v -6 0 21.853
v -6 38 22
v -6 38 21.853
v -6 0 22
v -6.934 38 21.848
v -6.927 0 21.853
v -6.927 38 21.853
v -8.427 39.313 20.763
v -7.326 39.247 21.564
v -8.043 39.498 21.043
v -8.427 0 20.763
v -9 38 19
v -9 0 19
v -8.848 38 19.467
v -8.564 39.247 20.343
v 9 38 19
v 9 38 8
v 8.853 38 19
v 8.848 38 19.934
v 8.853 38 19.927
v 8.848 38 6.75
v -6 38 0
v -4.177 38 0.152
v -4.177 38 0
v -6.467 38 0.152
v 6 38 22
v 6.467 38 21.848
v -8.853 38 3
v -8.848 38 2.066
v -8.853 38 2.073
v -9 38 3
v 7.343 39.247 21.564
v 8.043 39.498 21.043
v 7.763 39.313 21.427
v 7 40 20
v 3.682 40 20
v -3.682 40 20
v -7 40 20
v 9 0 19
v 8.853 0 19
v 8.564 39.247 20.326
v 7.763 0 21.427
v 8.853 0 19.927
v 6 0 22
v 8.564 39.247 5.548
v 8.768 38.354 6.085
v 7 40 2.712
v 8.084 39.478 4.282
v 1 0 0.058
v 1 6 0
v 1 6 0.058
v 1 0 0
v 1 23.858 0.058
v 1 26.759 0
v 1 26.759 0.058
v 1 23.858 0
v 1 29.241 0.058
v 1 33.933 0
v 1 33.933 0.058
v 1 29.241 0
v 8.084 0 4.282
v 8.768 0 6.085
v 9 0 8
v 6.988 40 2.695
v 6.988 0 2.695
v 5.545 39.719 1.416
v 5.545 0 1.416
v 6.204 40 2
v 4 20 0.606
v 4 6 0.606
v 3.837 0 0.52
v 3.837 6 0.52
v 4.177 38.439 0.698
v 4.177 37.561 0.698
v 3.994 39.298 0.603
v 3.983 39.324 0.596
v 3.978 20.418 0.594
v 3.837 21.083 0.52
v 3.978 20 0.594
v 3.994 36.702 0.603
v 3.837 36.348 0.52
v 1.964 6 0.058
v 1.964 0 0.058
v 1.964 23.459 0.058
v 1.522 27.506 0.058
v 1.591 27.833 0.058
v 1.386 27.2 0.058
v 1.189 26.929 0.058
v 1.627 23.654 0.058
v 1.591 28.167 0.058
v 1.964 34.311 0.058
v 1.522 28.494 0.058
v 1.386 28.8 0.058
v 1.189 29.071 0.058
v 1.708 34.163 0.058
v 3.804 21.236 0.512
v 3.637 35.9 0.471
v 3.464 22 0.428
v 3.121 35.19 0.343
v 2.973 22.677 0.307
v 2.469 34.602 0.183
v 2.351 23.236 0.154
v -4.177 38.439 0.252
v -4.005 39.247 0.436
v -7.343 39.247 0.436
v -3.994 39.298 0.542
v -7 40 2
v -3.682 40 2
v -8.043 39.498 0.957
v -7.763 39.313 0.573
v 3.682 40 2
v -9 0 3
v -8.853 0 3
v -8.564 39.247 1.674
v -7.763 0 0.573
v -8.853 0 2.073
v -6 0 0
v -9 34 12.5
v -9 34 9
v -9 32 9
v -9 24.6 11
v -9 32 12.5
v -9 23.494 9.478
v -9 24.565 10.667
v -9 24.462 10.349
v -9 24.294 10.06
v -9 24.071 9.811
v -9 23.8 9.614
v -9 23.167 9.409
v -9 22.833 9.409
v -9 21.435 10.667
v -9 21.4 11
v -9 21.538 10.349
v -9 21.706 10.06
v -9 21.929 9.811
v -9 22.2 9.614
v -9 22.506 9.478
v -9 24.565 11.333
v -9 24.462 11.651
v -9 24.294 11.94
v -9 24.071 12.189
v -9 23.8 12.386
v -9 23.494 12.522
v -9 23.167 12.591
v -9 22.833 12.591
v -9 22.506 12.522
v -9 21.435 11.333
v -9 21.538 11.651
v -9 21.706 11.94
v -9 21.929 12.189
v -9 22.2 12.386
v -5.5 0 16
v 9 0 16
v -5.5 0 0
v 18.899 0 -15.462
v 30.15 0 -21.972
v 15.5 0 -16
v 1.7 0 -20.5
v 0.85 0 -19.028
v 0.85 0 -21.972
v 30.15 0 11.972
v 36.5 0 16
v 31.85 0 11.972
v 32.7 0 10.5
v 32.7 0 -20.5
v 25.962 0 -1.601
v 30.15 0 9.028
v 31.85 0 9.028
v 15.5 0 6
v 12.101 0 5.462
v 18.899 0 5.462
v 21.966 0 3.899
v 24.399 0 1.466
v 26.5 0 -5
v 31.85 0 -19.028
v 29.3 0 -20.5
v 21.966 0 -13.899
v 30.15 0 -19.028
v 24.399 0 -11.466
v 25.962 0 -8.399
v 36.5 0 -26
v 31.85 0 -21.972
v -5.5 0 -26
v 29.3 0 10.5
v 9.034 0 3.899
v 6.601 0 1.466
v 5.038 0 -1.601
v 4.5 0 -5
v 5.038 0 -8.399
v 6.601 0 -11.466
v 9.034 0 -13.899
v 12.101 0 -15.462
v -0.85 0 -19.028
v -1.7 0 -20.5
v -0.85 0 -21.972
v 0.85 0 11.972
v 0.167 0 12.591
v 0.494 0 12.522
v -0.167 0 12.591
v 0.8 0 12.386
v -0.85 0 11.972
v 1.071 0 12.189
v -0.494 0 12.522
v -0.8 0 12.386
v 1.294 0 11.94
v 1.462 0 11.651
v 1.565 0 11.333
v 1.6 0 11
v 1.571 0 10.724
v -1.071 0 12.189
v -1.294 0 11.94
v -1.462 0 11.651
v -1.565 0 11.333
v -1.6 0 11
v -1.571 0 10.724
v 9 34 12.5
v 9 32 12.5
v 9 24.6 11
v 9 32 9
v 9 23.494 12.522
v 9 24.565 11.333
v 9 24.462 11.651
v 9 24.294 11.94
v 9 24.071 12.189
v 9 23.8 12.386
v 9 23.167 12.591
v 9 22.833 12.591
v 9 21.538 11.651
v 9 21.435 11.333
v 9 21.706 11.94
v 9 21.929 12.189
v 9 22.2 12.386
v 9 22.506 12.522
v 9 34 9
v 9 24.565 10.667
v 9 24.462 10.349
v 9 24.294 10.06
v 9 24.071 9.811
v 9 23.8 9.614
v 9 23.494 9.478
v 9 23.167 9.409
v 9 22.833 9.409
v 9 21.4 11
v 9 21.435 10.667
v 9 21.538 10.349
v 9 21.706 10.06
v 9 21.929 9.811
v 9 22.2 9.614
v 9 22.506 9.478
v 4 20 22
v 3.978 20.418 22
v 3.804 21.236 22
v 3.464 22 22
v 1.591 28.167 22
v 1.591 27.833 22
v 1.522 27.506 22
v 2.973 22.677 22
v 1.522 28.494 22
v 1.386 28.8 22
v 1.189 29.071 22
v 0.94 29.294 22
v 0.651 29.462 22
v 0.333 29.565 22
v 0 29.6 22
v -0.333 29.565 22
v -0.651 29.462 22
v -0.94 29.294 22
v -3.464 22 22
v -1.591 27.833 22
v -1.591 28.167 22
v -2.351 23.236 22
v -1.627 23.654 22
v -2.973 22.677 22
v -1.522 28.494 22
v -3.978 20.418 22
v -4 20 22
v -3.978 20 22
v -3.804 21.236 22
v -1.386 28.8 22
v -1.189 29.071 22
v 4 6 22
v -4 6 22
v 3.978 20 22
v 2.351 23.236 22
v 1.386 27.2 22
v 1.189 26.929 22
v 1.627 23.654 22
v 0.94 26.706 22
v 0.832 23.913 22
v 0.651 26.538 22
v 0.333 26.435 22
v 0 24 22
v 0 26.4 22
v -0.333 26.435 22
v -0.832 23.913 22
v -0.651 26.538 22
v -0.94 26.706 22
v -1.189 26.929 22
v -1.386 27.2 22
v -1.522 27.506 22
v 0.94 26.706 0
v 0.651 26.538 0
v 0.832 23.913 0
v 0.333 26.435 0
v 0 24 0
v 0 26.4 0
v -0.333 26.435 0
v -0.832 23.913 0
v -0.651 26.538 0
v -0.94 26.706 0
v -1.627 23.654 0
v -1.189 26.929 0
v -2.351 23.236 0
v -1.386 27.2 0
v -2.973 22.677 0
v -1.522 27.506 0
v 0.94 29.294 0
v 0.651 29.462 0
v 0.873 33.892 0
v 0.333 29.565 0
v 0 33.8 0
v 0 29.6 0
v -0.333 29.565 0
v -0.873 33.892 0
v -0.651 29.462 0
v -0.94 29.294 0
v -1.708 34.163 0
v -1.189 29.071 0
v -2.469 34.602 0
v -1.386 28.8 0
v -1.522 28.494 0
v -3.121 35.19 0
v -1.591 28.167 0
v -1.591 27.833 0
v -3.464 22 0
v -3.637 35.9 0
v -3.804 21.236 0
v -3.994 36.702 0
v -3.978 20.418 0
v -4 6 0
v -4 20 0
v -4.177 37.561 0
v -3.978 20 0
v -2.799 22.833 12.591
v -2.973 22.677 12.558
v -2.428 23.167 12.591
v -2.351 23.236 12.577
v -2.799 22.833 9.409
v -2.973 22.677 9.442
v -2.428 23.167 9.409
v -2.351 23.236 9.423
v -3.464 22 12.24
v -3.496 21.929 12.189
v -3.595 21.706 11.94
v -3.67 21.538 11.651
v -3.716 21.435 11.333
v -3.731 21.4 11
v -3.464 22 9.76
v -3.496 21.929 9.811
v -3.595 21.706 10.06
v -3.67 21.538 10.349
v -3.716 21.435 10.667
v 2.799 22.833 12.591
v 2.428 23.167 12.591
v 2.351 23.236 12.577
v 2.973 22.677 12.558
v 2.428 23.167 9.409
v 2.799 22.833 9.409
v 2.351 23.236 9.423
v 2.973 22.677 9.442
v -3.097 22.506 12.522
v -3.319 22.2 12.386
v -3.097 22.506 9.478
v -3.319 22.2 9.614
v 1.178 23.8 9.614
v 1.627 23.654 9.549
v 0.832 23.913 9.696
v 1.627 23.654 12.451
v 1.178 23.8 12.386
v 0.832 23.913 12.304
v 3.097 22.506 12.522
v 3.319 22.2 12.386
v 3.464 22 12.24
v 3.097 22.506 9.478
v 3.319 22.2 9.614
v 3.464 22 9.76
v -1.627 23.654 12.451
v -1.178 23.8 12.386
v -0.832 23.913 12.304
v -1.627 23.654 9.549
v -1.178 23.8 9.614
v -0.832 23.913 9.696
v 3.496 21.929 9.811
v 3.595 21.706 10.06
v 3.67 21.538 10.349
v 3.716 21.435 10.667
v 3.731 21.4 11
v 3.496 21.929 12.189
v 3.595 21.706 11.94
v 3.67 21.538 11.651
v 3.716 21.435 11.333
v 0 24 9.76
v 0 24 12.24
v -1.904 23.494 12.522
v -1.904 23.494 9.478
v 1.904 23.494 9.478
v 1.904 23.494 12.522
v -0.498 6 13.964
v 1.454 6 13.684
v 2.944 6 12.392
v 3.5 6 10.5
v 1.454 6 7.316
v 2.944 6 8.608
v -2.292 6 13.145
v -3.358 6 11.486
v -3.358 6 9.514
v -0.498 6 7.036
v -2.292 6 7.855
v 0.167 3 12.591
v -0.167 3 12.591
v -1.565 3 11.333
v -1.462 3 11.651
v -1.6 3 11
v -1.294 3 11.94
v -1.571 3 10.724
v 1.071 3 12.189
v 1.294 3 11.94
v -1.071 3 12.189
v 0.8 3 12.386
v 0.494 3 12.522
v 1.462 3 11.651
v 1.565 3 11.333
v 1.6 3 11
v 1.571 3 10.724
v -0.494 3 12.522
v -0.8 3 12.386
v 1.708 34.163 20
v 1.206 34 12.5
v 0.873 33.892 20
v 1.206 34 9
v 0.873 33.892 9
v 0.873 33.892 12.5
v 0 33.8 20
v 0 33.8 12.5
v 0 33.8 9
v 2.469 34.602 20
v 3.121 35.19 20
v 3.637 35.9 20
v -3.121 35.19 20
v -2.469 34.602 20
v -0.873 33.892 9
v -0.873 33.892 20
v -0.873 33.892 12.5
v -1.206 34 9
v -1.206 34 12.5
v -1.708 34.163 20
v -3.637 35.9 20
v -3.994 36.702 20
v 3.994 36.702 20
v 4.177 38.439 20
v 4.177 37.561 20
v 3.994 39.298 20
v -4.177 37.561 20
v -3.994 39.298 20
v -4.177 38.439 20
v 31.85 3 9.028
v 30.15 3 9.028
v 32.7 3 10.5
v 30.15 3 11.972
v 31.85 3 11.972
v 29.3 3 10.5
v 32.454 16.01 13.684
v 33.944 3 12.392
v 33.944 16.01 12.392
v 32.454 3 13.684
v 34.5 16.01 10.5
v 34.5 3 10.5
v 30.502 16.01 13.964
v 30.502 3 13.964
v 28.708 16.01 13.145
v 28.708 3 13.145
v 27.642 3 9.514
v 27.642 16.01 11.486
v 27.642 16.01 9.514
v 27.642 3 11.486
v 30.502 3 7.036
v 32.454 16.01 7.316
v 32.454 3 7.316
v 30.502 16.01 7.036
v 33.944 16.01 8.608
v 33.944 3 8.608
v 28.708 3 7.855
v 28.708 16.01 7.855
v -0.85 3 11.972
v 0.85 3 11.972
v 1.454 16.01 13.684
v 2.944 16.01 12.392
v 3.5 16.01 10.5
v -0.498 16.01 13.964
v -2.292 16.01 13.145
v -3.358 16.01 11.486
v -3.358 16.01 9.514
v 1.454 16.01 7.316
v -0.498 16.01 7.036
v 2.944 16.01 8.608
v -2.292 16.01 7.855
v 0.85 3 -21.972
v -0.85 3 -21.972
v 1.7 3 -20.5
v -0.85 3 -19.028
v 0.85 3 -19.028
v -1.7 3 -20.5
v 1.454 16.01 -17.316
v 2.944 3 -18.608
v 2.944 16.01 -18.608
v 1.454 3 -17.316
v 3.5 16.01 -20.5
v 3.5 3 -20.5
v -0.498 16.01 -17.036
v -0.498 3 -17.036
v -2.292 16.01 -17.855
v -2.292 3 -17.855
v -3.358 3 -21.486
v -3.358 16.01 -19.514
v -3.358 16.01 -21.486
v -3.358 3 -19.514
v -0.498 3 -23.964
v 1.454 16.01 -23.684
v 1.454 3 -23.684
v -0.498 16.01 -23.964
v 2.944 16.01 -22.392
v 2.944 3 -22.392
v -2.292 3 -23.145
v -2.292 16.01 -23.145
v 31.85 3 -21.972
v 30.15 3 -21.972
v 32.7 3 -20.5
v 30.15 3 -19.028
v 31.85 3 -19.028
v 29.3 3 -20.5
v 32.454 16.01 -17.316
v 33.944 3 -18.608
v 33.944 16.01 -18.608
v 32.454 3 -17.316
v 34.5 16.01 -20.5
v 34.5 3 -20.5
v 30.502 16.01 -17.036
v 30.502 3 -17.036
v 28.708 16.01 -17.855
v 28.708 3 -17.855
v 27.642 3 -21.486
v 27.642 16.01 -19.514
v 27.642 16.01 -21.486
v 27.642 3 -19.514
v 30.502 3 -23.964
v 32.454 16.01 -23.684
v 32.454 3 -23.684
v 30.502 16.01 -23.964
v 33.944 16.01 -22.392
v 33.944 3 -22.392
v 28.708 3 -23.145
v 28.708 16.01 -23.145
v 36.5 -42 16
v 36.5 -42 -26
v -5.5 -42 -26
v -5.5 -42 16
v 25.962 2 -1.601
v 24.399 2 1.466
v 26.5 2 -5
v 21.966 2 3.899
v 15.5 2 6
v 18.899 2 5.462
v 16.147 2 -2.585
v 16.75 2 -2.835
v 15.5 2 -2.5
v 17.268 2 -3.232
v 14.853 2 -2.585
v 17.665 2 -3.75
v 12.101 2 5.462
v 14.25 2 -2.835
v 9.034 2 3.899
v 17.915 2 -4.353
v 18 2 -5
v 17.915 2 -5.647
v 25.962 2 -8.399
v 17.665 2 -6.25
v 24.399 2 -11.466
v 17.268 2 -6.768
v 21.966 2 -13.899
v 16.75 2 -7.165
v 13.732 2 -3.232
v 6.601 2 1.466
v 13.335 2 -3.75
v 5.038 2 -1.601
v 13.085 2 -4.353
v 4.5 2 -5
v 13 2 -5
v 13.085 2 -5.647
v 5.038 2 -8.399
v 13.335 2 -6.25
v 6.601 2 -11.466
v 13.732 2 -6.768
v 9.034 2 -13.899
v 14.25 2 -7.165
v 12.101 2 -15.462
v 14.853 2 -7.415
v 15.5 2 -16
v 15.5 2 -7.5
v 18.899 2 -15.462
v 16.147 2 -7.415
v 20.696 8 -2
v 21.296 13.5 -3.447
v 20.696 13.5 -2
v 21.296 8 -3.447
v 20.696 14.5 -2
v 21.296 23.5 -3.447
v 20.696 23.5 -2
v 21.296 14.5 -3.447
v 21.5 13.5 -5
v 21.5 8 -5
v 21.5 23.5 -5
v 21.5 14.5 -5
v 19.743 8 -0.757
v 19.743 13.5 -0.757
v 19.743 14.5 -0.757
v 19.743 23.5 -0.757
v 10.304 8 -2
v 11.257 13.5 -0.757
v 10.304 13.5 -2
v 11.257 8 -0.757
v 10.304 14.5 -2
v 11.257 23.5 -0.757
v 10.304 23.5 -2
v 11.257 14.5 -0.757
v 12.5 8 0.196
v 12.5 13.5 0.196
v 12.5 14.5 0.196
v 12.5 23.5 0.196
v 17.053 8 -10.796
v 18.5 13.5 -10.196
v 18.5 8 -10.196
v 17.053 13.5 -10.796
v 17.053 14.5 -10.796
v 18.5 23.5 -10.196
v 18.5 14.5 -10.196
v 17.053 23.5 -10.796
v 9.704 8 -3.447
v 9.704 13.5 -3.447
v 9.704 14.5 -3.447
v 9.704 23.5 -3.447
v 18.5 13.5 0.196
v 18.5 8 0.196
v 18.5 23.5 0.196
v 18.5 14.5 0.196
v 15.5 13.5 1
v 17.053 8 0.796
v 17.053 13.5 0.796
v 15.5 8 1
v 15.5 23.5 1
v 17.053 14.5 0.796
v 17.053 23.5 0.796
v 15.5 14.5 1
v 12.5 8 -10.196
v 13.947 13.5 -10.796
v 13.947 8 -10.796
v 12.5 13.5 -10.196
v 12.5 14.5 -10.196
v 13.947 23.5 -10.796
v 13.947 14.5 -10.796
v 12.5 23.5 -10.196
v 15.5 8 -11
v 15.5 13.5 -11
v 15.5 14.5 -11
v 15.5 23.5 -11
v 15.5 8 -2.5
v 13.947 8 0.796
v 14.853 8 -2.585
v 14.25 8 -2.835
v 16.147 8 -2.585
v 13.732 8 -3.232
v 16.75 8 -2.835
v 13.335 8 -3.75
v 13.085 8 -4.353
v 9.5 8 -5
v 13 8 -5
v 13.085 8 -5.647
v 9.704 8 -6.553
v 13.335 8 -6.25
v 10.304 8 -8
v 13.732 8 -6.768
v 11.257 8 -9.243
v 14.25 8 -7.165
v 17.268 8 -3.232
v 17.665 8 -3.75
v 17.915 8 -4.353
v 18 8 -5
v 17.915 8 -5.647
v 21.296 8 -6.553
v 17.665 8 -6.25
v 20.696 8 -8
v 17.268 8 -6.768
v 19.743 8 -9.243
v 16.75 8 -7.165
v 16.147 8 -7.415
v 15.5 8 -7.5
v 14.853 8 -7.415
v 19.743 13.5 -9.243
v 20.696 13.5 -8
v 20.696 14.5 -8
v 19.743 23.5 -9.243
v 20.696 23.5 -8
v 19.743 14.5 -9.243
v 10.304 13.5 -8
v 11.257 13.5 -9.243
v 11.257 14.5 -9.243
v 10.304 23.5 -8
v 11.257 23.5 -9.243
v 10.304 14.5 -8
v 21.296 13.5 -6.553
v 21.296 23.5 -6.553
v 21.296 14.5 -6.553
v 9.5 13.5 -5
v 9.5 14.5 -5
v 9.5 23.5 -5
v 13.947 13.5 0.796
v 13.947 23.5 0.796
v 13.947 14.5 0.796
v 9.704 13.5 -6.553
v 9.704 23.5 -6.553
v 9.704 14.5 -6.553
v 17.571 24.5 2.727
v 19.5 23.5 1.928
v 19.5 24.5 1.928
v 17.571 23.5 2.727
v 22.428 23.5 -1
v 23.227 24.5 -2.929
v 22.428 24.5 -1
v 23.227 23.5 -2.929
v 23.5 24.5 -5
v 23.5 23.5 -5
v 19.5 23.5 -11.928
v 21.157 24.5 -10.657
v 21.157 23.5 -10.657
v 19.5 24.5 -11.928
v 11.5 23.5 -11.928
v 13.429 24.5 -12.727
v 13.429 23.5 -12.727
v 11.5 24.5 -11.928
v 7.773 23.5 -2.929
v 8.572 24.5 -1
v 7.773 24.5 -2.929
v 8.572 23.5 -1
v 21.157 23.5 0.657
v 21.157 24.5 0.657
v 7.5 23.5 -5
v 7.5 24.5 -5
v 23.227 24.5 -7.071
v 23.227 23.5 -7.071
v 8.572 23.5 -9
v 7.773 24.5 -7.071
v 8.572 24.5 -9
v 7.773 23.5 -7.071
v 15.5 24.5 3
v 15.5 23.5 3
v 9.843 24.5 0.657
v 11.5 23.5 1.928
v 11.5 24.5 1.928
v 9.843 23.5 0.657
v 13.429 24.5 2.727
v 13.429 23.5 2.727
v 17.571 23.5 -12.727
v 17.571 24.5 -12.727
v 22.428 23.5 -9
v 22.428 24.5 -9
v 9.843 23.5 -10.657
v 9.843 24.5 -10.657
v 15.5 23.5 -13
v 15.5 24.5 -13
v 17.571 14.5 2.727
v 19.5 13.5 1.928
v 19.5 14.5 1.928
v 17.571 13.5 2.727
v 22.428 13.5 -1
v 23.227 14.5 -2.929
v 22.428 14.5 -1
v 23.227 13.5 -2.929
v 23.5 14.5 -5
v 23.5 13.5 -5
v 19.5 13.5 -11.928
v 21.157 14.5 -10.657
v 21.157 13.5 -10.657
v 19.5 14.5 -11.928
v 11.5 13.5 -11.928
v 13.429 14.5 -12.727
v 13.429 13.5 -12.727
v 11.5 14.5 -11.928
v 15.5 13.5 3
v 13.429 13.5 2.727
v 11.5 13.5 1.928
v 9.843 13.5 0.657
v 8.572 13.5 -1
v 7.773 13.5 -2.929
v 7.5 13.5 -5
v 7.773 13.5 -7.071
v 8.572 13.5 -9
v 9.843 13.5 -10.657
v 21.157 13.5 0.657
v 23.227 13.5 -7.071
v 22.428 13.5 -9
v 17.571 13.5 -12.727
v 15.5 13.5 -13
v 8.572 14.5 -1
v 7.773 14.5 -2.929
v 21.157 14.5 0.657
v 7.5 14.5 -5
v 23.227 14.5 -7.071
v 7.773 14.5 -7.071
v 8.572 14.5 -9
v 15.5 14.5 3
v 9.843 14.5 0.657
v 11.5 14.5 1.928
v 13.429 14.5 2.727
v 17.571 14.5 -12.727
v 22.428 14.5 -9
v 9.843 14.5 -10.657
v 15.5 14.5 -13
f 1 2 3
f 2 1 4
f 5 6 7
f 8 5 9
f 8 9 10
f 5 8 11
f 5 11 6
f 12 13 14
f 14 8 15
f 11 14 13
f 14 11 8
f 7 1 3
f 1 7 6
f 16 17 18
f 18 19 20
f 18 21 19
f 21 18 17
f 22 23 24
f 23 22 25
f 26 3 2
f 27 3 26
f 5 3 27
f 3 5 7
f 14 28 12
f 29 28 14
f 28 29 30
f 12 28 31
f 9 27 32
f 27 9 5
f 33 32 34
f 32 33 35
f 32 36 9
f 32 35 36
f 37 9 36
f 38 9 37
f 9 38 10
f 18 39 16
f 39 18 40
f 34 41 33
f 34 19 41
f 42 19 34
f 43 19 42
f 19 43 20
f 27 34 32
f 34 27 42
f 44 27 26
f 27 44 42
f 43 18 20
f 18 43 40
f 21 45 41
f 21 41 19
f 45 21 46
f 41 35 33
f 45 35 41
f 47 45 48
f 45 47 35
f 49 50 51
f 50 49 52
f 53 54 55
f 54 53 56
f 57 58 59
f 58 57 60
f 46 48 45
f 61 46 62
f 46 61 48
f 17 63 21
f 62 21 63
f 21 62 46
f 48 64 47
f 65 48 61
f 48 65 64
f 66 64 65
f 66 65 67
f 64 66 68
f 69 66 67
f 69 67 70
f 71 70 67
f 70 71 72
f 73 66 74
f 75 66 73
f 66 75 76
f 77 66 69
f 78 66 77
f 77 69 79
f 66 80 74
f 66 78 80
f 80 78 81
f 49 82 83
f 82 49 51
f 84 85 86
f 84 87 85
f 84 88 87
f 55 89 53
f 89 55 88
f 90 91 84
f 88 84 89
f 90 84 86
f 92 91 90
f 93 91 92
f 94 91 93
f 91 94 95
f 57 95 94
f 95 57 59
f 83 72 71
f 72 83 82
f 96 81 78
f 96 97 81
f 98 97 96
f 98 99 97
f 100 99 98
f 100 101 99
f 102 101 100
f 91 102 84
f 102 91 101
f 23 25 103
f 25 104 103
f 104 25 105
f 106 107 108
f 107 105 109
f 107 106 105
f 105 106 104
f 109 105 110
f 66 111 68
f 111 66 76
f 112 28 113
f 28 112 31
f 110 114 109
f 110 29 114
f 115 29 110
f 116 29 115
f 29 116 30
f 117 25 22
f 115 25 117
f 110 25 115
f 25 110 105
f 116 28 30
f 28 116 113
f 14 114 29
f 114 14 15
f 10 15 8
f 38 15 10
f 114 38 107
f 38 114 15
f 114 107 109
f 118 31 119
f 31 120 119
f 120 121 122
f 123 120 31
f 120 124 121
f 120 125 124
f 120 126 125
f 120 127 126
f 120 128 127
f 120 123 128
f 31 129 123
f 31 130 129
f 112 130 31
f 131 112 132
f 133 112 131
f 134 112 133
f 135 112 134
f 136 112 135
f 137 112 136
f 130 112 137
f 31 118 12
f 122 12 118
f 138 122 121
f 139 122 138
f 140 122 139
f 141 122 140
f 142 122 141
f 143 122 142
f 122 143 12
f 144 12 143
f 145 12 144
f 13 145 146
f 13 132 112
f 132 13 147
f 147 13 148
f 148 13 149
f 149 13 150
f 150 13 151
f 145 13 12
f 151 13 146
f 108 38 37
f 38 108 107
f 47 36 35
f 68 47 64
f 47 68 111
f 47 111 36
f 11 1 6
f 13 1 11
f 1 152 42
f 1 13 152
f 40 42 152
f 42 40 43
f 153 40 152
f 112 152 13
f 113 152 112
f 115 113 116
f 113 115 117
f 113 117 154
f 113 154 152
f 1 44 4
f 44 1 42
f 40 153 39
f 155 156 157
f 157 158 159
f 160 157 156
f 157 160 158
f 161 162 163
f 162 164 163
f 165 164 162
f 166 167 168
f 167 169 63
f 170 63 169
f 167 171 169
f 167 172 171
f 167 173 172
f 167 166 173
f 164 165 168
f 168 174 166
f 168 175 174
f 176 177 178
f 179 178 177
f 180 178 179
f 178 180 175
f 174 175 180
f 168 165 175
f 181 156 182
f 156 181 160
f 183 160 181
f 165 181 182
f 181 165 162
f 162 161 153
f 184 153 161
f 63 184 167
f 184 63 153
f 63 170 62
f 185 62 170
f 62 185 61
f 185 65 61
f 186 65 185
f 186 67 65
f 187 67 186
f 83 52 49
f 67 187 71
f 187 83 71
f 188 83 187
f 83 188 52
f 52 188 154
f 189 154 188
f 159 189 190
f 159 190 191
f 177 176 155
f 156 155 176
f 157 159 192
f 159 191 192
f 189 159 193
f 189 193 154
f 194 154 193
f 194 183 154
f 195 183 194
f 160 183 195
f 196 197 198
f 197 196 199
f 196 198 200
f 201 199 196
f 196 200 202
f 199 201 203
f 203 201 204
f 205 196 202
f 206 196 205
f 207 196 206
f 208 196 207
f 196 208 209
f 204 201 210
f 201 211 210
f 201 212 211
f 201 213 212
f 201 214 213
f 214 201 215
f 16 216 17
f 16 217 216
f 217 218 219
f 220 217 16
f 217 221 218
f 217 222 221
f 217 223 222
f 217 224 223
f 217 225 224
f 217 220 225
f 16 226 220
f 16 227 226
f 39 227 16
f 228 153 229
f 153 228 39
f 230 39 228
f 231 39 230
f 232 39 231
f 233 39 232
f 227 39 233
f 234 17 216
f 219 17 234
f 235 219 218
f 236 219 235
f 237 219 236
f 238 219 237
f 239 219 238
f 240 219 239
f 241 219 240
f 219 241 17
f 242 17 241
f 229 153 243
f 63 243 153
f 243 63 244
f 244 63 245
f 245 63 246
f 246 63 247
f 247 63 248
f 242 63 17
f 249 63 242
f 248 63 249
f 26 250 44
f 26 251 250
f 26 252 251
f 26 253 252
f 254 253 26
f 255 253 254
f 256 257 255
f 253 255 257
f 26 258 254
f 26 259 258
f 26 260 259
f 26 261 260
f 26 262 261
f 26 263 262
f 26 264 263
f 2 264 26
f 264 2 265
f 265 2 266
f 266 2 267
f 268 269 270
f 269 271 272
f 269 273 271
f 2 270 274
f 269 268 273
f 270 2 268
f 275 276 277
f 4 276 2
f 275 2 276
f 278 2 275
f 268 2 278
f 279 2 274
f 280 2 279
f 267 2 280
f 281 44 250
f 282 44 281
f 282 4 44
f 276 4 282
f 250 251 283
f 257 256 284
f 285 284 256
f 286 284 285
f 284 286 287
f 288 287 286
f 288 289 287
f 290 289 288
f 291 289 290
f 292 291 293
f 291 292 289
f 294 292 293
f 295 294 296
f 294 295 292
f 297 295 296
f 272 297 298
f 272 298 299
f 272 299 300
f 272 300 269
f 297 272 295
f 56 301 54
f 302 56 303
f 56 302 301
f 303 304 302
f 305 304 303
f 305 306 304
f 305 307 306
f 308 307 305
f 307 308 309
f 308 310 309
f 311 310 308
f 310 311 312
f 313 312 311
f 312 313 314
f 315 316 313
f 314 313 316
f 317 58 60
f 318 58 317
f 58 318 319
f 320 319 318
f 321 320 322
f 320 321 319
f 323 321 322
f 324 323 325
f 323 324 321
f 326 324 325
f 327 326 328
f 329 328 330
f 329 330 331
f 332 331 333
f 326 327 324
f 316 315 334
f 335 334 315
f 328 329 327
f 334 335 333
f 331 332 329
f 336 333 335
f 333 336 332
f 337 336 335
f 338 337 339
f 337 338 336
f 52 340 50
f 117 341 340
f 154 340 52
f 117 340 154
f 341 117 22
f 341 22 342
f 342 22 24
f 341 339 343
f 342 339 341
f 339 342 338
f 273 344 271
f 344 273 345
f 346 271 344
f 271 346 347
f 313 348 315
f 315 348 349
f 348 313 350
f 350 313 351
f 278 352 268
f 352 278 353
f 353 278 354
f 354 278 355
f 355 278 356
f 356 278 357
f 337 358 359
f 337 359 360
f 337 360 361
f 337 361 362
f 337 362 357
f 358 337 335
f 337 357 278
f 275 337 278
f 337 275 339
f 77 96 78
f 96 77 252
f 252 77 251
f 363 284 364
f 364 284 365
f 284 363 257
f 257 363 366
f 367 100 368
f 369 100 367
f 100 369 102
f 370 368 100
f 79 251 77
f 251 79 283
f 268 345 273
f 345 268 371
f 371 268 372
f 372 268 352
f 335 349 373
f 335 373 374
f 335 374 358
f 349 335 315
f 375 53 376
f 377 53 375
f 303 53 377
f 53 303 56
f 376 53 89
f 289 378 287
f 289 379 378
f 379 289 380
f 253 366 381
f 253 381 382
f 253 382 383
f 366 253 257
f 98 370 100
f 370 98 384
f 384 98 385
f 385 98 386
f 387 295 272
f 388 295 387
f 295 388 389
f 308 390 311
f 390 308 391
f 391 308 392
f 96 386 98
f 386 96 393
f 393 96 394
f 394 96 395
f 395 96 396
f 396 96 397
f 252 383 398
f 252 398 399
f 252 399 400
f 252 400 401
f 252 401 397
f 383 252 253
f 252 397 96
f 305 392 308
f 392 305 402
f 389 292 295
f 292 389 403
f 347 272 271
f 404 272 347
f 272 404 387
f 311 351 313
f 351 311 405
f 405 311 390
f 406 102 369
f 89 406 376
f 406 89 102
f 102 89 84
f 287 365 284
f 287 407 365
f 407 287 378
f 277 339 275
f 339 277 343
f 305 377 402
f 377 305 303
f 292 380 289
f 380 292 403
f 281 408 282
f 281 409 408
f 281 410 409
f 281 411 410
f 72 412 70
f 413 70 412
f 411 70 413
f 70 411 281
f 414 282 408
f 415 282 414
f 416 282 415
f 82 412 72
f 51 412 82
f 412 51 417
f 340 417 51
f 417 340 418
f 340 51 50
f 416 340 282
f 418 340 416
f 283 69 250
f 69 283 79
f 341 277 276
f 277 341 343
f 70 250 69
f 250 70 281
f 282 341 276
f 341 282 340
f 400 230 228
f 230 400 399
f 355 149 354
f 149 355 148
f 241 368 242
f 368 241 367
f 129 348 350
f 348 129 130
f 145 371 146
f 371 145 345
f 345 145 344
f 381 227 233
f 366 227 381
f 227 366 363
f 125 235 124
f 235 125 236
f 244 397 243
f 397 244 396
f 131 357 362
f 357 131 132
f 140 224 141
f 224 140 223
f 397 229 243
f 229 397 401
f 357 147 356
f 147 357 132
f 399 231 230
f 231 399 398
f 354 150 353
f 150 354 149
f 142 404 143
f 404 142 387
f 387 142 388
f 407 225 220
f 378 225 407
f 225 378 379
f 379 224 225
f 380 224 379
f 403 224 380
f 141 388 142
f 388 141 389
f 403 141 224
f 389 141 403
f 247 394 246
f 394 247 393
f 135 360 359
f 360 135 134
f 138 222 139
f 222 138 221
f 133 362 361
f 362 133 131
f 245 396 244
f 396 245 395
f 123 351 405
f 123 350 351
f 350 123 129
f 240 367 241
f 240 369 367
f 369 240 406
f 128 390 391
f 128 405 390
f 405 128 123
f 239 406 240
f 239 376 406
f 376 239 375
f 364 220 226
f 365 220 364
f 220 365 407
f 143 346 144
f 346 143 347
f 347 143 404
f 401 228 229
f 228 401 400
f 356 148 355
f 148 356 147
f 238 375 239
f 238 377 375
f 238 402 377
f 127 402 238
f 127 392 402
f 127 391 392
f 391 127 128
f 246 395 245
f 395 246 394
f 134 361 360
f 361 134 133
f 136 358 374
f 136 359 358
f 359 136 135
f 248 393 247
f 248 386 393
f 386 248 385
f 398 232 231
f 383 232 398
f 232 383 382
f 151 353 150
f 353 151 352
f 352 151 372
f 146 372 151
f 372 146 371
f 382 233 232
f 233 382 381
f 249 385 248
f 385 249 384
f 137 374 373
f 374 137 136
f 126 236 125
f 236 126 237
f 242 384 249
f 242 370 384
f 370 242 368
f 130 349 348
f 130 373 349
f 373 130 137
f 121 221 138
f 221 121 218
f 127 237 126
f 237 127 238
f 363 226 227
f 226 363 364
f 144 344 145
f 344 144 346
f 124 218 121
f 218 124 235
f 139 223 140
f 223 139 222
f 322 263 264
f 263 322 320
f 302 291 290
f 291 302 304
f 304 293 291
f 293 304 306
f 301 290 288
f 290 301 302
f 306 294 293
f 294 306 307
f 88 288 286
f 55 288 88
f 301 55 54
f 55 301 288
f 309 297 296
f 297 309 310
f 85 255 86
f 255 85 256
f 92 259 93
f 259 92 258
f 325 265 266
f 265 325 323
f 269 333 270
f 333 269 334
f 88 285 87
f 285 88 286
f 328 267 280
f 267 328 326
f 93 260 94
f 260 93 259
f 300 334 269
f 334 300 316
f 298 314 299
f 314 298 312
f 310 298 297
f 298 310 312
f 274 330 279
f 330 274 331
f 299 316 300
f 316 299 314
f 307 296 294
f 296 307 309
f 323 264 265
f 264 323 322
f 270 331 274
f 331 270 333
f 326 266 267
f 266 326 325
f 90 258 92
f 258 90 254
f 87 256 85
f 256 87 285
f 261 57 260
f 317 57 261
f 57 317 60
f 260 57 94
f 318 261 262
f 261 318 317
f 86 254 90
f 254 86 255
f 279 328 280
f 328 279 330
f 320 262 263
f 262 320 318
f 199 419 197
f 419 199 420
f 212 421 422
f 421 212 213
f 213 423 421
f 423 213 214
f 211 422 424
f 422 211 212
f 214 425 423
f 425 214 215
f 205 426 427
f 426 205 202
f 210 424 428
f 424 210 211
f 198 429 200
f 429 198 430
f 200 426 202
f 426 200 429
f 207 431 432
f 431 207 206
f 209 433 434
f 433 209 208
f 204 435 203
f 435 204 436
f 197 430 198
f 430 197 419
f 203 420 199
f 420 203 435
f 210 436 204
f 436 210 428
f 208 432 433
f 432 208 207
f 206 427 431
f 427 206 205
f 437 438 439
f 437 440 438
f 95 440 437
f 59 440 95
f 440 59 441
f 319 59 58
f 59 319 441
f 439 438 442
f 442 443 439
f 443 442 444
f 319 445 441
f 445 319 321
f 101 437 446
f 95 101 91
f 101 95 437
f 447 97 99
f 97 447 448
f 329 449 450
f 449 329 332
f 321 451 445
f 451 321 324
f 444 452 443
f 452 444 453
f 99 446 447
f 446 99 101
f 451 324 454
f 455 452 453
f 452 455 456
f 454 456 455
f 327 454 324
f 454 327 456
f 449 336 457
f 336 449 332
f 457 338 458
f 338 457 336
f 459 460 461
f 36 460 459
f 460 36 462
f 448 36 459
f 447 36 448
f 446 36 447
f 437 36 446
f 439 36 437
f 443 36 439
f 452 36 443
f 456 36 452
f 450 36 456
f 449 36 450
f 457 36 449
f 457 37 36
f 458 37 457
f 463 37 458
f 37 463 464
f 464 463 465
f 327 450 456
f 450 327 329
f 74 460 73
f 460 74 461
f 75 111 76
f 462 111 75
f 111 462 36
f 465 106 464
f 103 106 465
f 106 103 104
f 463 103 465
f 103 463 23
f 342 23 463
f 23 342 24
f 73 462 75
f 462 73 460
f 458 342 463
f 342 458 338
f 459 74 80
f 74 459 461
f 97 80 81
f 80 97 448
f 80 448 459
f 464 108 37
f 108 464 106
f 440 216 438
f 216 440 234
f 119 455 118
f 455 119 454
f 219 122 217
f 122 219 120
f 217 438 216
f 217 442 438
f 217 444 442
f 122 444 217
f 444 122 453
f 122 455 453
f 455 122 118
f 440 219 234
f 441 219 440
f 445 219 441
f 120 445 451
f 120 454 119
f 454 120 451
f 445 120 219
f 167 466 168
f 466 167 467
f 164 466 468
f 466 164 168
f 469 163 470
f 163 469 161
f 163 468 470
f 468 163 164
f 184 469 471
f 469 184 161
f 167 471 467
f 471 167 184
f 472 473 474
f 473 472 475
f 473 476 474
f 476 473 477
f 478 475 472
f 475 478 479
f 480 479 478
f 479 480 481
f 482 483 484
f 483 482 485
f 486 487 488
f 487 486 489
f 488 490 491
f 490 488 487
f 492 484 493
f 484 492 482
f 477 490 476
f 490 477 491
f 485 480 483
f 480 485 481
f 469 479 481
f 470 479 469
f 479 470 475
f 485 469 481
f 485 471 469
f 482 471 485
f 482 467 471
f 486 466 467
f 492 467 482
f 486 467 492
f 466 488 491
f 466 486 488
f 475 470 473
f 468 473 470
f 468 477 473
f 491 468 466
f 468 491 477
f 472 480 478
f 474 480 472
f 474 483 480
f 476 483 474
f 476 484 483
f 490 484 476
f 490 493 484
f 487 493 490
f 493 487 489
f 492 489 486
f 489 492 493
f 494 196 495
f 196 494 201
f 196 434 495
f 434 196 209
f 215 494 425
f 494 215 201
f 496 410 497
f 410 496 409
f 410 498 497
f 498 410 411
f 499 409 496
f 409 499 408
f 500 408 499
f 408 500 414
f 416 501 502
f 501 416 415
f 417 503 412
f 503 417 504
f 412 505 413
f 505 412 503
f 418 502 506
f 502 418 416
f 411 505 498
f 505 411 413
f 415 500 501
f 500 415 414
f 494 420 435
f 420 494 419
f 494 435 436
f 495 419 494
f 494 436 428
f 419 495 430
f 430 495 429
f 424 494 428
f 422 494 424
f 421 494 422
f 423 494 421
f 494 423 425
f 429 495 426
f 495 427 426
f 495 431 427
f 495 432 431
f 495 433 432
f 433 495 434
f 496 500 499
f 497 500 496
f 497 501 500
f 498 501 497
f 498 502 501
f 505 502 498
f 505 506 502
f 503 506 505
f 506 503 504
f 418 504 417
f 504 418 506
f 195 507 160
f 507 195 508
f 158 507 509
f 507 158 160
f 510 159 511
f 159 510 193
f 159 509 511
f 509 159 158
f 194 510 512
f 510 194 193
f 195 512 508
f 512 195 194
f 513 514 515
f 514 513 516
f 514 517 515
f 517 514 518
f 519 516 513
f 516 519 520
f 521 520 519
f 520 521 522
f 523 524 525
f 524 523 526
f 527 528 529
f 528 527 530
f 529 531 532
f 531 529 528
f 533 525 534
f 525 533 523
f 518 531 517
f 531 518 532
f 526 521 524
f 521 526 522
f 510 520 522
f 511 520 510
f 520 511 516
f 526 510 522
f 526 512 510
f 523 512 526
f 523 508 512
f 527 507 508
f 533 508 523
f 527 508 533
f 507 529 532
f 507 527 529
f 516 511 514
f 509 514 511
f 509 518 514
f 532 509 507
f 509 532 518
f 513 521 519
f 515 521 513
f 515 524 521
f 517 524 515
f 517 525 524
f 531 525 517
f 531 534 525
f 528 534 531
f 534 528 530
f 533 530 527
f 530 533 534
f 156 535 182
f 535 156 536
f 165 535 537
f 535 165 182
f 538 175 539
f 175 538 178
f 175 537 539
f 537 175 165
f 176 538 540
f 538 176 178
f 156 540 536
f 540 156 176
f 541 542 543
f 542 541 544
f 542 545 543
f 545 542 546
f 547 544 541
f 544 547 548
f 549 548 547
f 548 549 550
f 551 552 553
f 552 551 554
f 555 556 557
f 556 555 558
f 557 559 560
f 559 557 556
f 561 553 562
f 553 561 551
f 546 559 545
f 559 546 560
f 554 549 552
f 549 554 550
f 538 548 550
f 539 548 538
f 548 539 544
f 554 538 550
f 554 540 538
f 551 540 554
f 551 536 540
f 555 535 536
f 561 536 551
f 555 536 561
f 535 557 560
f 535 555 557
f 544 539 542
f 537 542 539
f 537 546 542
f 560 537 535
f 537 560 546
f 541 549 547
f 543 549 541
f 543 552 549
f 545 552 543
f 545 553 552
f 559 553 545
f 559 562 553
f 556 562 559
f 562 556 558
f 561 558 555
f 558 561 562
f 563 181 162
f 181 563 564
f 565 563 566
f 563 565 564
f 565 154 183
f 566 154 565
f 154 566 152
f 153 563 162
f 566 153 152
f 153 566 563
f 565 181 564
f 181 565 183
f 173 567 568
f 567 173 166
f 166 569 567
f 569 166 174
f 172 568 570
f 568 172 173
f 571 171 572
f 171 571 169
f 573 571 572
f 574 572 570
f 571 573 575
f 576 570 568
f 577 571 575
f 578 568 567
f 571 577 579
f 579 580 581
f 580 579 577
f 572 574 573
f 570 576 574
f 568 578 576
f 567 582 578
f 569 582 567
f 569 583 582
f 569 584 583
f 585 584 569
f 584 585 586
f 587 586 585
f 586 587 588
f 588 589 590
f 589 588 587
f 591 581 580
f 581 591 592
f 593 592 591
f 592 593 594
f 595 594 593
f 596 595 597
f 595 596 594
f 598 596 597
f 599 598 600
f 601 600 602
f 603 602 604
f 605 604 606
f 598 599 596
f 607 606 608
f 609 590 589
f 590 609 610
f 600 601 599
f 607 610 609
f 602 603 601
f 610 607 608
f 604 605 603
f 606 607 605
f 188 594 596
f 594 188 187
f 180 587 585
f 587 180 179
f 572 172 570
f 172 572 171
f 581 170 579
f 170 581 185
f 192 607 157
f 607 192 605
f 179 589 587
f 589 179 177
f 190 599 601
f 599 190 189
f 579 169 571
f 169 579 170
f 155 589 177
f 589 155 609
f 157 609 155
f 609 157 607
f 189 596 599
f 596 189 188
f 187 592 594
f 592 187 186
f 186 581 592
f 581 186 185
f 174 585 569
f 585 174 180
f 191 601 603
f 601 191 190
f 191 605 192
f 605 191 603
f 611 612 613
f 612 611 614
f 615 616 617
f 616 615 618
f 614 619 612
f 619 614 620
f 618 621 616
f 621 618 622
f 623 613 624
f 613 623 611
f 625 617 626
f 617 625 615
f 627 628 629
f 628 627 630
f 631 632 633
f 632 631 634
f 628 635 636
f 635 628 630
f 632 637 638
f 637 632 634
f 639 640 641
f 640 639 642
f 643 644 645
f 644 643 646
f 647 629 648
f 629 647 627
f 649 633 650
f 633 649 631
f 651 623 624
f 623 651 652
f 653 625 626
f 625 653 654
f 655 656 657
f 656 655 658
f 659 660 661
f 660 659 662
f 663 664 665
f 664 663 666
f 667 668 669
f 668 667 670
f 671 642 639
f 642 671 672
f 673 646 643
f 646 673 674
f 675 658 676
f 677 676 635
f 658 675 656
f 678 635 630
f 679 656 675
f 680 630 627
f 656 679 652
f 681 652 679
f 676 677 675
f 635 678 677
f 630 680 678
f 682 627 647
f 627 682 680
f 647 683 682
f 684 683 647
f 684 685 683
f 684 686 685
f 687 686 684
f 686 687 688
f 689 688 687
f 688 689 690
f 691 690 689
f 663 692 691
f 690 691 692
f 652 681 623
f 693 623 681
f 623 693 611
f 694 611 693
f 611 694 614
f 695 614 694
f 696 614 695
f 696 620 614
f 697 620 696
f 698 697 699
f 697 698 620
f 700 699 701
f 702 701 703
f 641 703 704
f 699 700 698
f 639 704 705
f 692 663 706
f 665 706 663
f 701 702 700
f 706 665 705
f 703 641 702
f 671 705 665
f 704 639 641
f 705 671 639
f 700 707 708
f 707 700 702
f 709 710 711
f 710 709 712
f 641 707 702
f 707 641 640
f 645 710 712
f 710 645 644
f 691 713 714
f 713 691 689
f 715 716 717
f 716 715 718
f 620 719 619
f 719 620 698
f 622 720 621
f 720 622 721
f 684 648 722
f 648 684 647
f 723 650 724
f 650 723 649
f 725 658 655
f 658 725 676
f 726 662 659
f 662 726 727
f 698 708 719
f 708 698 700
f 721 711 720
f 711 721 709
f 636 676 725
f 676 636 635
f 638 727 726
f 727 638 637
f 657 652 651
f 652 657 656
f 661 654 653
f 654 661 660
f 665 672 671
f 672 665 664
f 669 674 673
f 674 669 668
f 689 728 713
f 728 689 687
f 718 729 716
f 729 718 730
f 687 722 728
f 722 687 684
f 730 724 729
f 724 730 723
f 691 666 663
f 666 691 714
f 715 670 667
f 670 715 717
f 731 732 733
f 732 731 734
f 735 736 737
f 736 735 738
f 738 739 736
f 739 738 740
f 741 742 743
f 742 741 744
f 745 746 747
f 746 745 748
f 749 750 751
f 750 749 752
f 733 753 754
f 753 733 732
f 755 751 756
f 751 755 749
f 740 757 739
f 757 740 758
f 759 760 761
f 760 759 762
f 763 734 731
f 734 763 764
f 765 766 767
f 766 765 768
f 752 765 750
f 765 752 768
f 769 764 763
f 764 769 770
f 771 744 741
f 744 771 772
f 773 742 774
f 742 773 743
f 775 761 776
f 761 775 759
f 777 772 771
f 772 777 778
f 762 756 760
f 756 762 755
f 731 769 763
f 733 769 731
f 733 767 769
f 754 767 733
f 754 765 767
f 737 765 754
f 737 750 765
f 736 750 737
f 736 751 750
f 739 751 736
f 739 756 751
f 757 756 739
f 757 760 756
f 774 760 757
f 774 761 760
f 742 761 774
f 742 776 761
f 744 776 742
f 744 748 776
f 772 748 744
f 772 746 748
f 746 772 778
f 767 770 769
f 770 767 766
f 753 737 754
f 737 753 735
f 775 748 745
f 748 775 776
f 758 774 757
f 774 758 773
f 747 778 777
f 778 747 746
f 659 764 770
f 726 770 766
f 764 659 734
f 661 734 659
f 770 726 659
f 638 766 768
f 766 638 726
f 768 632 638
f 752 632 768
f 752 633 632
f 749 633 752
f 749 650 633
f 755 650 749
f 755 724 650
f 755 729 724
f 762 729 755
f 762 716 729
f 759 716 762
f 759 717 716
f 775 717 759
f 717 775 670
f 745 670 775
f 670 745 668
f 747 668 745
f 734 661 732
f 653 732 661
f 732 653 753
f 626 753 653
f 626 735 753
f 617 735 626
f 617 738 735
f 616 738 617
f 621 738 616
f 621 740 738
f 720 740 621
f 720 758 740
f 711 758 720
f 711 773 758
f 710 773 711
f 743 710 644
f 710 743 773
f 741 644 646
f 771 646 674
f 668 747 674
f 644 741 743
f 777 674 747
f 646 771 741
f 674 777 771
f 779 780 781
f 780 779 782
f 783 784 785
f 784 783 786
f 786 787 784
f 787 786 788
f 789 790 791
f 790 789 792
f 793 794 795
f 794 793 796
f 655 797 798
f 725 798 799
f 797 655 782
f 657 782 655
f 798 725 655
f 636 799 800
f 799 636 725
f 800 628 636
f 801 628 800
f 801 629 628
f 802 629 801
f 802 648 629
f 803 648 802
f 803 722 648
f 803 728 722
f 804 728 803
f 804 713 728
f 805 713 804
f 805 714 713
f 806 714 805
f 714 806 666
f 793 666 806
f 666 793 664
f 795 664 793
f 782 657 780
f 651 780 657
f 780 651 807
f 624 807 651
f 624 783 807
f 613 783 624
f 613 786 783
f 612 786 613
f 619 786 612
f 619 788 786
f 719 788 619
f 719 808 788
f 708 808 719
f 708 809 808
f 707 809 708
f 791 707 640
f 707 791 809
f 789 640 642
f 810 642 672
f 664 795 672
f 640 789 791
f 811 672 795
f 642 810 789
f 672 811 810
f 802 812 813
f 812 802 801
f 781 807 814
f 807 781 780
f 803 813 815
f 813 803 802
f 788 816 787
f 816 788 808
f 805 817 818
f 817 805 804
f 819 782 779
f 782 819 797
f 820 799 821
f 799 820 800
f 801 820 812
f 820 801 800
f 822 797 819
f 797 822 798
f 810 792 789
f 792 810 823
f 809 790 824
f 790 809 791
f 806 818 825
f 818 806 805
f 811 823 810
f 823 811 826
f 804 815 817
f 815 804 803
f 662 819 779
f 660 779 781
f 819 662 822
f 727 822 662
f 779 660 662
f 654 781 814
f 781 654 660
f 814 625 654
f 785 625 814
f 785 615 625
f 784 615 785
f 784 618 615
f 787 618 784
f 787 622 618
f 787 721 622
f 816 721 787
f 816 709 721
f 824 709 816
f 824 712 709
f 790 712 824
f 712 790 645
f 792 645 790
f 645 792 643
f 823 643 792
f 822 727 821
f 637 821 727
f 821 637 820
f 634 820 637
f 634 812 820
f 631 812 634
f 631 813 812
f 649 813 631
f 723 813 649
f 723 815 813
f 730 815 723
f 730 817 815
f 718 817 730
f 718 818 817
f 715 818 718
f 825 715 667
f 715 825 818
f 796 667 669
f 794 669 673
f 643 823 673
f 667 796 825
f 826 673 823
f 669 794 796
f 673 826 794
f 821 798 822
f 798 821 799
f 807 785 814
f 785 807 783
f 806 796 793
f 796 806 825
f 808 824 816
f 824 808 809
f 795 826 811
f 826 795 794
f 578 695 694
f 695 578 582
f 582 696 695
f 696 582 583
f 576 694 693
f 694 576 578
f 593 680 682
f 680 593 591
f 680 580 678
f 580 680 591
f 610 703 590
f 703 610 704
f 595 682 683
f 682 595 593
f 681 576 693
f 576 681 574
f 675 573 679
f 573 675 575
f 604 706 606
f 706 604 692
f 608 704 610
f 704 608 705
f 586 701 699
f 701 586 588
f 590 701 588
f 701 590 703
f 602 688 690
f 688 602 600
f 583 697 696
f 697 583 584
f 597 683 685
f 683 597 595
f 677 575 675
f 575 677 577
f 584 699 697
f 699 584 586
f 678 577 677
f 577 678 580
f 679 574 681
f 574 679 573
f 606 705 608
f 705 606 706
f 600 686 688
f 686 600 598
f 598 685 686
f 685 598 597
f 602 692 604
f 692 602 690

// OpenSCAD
// file: inc/funciones.scad
// Nueva impresora by Chema <josema@pentabyte.es>
// Funciones que se usan en otros archivos
// GNU GPL v3
// Mod from
// Josef Průša <josefprusa@me.com>
// Václav 'ax' Hůla <axtheb@gmail.com>
// Vlnofka <>
// http://www.reprap.org/wiki/Prusa_Mendel
// http://github.com/prusajr/PrusaMendel

module screw(h=20, r=2, r_head=3.5, head_drop=0, slant=true, poly=false, $fn=0){
    //makes screw with head
    //for substraction as screw hole
    if (poly) {
        cylinder_poly(h=h, r=r, $fn=$fn);
    } else {
        cylinder(h=h, r=r, $fn=$fn);
    }
    if (slant) {
        translate([0, 0, head_drop-0.01]) cylinder(h=r_head, r2=0, r1=r_head, $fn=$fn);
    }

    if (head_drop > 0) {
        translate([0, 0, -0.01]) cylinder(h=head_drop+0.01, r=r_head, $fn=$fn);
    }
}

module nema17(places=[1,1,1,1], size=15.5, h=10, holes=false, polea=false, shaft=true, shadow=false, $fn=24){
    for (i=[0:3]) {
        if (places[i] == 1) {
            rotate([0, 0, 90*i]) translate([size, size, 0]) {
                if (holes) {
                    #rotate([0, 0, -90*i])  translate([0,0,-h]) screw(r=1.7, slant=false, head_drop=13, $fn=$fn, h=h+12);
                } else {
                    //rotate([0, 0, -90*i]) cylinder(h=h, r=5.5, $fn=$fn);
                }
            }
        }
    }
    if (shadow != false) {
        translate ([0, 0, shadow+21+3]) cube([42,42,42], center = true);
    //flange
        translate ([0, 0, shadow+21+3-21-1]) cylinder(r=11,h=2, center = true, $fn=20);
     }

	if (polea != false) {
	translate ([0,0,-4-4]) cylinder(r=polea/2,h=16,center=true);
	translate ([0,0,-4-12]) cylinder(r=(polea/2)+2,h=1,center=true);
	translate ([0,0,-4-12+10]) cylinder(r=(polea/2)+2,h=1,center=true);
	}
	
	if(shaft){
   //shaft
        translate ([0, 0, shadow+21+3-21-7-5]) cylinder(r=2.5,h=24, center = true);
	}


}

module nut(d,h,horizontal=true){
    cornerdiameter =  (d / 2) / cos (180 / 6);
    cylinder(h = h, r = cornerdiameter, $fn = 6);
    if(horizontal){
        for(i = [1:6]){
            rotate([0,0,60*i]) translate([-cornerdiameter-0.2,0,0]) rotate([0,0,-45]) cube([2,2,h]);
        }
    }
}

// Based on nophead research
module polyhole(d, h, center=false) {
    n = max(round(2 * d),3);
    rotate([0,0,180])
        cylinder(h = h, r = (d / 2) / cos (180 / n), $fn = n);
}

// make it interchangeable between this and cylinder
module cylinder_poly(r, h, center=false){
    polyhole(d=r*2, h=h, center=center);
}

module fillet(radius, height=100, $fn=0) {
    //this creates acutal fillet
    translate([-radius, -radius, -height/2-0.01])
        difference() {
            cube([radius*2, radius*2, height+0.02]);
            cylinder(r=radius, h=height+0.02, $fn=$fn);
        }
}

module cube_fillet(size, radius=-1, vertical=[3,3,3,3], top=[0,0,0,0], bottom=[0,0,0,0], center=false, $fn=0){
    //
    if (center) {
        cube_fillet_inside(size, radius, vertical, top, bottom, $fn);
    } else {
        translate([size[0]/2, size[1]/2, size[2]/2])
            cube_fillet_inside(size, radius, vertical, top, bottom, $fn);
    }
}

module cube_negative_fillet(size, radius=-1, vertical=[3,3,3,3], top=[0,0,0,0], bottom=[0,0,0,0], $fn=0){

    j=[1,0,1,0];

    for (i=[0:3]) {
        if (radius > -1) {
            rotate([0, 0, 90*i]) translate([size[1-j[i]]/2, size[j[i]]/2, 0]) fillet(radius, size[2], $fn=$fn);
        } else {
            rotate([0, 0, 90*i]) translate([size[1-j[i]]/2, size[j[i]]/2, 0]) fillet(vertical[i], size[2], $fn=$fn);
        }
        rotate([90*i, -90, 0]) translate([size[2]/2, size[j[i]]/2, 0 ]) fillet(top[i], size[1-j[i]], $fn=$fn);
        rotate([90*(4-i), 90, 0]) translate([size[2]/2, size[j[i]]/2, 0]) fillet(bottom[i], size[1-j[i]], $fn=$fn);

    }
}

module cube_fillet_inside(size, radius=-1, vertical=[3,3,3,3], top=[0,0,0,0], bottom=[0,0,0,0], $fn=0){
    //makes CENTERED cube with round corners
    // if you give it radius, it will fillet vertical corners.
    //othervise use vertical, top, bottom arrays
    //when viewed from top, it starts in upper right corner (+x,+y quadrant) , goes counterclockwise
    //top/bottom fillet starts in direction of Y axis and goes CCW too


    if (radius == 0) {
        cube(size, center=true);
    } else {
        difference() {
            cube(size, center=true);
            cube_negative_fillet(size, radius, vertical, top, bottom, $fn);
        }
    }
}

module pushfit_rod(diameter,length){
 cylinder(h = length, r=diameter/2, $fn=30);
 translate(v=[0,-diameter/4,length/2]) cube(size = [diameter,diameter/2,length], center = true);
 translate(v=[0,-diameter/2-2,length/2]) cube(size = [diameter,1,length], center = true);
}
// file: inc/metric.scad
// PRUSA Mendel  
// Default metric sizes
// GNU GPL v2
// Josef Průša
// josefprusa@me.com
// prusadjs.cz
// http://www.reprap.org/wiki/Prusa_Mendel
// http://github.com/prusajr/PrusaMendel

// DONT CHANGE THIS FILE! ALTER VALUES IN CONFIGURATION.SCAD INSTEAD

// RODS

threaded_rod_diameter = 8.2;
threaded_rod_diameter_horizontal = 8.2;
smooth_bar_diameter = 8;
smooth_bar_diameter_horizontal = 8.5;

// Nuts and bolts

m8_diameter = 9;
m8_nut_diameter = 16.4;

m4_diameter = 4.5;
m4_nut_diameter = 9;

m3_diameter = 3.6;
m3_nut_diameter = 6.1;

// Bushing holder

bushing_core_diameter = smooth_bar_diameter;
bushing_material_thickness = 1;

// Motors

motor_shaft = 5.5;
// file: inc/config.scad
// New Printer by Chema
// GNU GPL v3

// Mod basado en
// Josef Průša
// josefprusa@me.com
// prusadjs.cz
// http://www.reprap.org/wiki/Prusa_Mendel
// http://github.com/prusajr/PrusaMendel

// Esquinas:
altura = 40;
fondo = 22;
ancho = 18;
bajos = 6;

grueso=5+2;

//x_end data y-carriage
x_end_alto=33;
x_end_largo=60;
x_end_ancho=35+8;

//altura polea respecto barra superior
//pos barra altura-2 del motor
//pos polea (shaft motor 24mm, polea 18mm alto) 6mm sobre motor (+-2mm)
//espacio para polea (altura) = 12-14mm

//x_rod_distance = (altura-2+grueso-x_end_alto)*2; //29.25*2;
x_rod_distance = 29.25*2;
y_rod_distance = 55;

bearing_diameter = 10;
thinwall = 2;
bearing_size = bearing_diameter + 2 * thinwall;



//x-carriage
xc_alto=29.25;
xc_largo=90;
xc_ancho=altura-2+grueso-x_end_alto;



// PLEASE SELECT ONE OF THE CONFIGURATIONS BELOW
// BY UN-COMMENTING IT

// Uncomment for metric settings
// METRIC METRIC METRIC METRIC METRIC METRIC METRIC METRIC 

include <metric.scad>;

// Uncomment for imperial settings
// IMPERIAL IMPERIAL IMPERIAL IMPERIAL IMPERIAL IMPERIAL IMPERIAL 

//include <sae.scad>;

// LM8UU
linear = false;


// CHANGE ONLY THE STUFF YOU KNOW
// IT WILL REPLACE DEFAULT SETTING

// RODS

// threaded_rod_diameter = 0;
// threaded_rod_diameter_horizontal = 0;
// smooth_bar_díameter = 0;
// smooth_bar_díameter_horizontal = 0;

// Nuts and bolts

// m8_diameter = 0;
// m8_nut_diameter = 0;

// m4_diameter = 0;
// m4_nut_diameter = 0;

// m3_diameter = 0;
// m3_nut_diameter = 0;

// Bushing holder

// bushing_core_diameter = smooth_bar_díameter;
// bushing_material_thickness = 0;


///counted stuff
m3_nut_diameter_bigger = ((m3_nut_diameter  / 2) / cos (180 / 6))*2;

// funciones 
include <funciones.scad>


// Select your belt type ******************************************************

//T2.5
//belt_tooth_distance = 2.5;
//belt_tooth_ratio = 0.5;

//T5 (strongly discouraged)
//belt_tooth_distance = 5;
//belt_tooth_ratio = 0.75;

//HTD3
//belt_tooth_distance = 3;
//belt_tooth_ratio = 0.75;

//MXL
//belt_tooth_distance = 2.032;
//belt_tooth_ratio = 0.64;

//GT2
belt_tooth_distance = 2;
belt_tooth_ratio = 0.5;
belt_grueso = 0.75;
belt_ancho = 6;
// main file
// Nueva impresora by Chema
// Esquinas
// GNU GPL v3
// Chema Muñoz (josema@pentabyte.es)

include <inc/config.scad>

// *************** Esquina *************************

module agujeros_esquina(){
 translate([-11,-11,0]){
  // fijación pared abajo
  translate([0,fondo/2,altura-17]) rotate([0,90,0]) translate([0,0,-5]) cylinder(h = 270, r=1.6, $fn=30);
  // Fijación pared arriba
  translate([(ancho+4)/2,0,altura-12]) rotate([0,90,90]) translate([0,0,-5]) cylinder(h = 270, r=1.6, $fn=30);
  // Acceso para el tornillo
  translate([11,0,14+bajos]) rotate([0,0,90]) rotate([0,90,0]) translate([0,0,-5]) {
	cylinder(h = 270, r=4, $fn=30);
	translate([7,0,20])
	cube(size=[14,8,50],center=true);
	}
  // Agujero del tornillo
  translate([11,11,00]) rotate([0,0,0]) translate([0,0,-5]) cylinder(h = 20, r=1.6, $fn=30);

  // Hueco para barra lisa
  translate([(ancho+4)/2,2-5,altura-2]) rotate([0,90,90]) cylinder(h = 23, r=4.2, $fn=30); 
  // Brida
  translate([-5,(fondo/2)-2,altura-8])  cube([ancho*2,3.5,2]);
 }
}

// Final
module esquina(){
 // Rotate the part for better printing
 translate([0,0,11]) rotate([-90,180,0]) difference(){
	translate([0,0,altura/2]) cube_fillet([ancho,fondo,altura], vertical=[3,3,8,3], top=[2,2,2,2], center=true);
  	agujeros_esquina();
 }
}
// ***********************************************

esquina();
translate ([15.5,0+8,-5]) rotate ([90,0,0]) {
nema17(h=8,holes=true,shadow=5, polea=12);}

//translate ([0,-bearing_size/2-21,0]) cube([5,x_rod_distance+21,5]);
